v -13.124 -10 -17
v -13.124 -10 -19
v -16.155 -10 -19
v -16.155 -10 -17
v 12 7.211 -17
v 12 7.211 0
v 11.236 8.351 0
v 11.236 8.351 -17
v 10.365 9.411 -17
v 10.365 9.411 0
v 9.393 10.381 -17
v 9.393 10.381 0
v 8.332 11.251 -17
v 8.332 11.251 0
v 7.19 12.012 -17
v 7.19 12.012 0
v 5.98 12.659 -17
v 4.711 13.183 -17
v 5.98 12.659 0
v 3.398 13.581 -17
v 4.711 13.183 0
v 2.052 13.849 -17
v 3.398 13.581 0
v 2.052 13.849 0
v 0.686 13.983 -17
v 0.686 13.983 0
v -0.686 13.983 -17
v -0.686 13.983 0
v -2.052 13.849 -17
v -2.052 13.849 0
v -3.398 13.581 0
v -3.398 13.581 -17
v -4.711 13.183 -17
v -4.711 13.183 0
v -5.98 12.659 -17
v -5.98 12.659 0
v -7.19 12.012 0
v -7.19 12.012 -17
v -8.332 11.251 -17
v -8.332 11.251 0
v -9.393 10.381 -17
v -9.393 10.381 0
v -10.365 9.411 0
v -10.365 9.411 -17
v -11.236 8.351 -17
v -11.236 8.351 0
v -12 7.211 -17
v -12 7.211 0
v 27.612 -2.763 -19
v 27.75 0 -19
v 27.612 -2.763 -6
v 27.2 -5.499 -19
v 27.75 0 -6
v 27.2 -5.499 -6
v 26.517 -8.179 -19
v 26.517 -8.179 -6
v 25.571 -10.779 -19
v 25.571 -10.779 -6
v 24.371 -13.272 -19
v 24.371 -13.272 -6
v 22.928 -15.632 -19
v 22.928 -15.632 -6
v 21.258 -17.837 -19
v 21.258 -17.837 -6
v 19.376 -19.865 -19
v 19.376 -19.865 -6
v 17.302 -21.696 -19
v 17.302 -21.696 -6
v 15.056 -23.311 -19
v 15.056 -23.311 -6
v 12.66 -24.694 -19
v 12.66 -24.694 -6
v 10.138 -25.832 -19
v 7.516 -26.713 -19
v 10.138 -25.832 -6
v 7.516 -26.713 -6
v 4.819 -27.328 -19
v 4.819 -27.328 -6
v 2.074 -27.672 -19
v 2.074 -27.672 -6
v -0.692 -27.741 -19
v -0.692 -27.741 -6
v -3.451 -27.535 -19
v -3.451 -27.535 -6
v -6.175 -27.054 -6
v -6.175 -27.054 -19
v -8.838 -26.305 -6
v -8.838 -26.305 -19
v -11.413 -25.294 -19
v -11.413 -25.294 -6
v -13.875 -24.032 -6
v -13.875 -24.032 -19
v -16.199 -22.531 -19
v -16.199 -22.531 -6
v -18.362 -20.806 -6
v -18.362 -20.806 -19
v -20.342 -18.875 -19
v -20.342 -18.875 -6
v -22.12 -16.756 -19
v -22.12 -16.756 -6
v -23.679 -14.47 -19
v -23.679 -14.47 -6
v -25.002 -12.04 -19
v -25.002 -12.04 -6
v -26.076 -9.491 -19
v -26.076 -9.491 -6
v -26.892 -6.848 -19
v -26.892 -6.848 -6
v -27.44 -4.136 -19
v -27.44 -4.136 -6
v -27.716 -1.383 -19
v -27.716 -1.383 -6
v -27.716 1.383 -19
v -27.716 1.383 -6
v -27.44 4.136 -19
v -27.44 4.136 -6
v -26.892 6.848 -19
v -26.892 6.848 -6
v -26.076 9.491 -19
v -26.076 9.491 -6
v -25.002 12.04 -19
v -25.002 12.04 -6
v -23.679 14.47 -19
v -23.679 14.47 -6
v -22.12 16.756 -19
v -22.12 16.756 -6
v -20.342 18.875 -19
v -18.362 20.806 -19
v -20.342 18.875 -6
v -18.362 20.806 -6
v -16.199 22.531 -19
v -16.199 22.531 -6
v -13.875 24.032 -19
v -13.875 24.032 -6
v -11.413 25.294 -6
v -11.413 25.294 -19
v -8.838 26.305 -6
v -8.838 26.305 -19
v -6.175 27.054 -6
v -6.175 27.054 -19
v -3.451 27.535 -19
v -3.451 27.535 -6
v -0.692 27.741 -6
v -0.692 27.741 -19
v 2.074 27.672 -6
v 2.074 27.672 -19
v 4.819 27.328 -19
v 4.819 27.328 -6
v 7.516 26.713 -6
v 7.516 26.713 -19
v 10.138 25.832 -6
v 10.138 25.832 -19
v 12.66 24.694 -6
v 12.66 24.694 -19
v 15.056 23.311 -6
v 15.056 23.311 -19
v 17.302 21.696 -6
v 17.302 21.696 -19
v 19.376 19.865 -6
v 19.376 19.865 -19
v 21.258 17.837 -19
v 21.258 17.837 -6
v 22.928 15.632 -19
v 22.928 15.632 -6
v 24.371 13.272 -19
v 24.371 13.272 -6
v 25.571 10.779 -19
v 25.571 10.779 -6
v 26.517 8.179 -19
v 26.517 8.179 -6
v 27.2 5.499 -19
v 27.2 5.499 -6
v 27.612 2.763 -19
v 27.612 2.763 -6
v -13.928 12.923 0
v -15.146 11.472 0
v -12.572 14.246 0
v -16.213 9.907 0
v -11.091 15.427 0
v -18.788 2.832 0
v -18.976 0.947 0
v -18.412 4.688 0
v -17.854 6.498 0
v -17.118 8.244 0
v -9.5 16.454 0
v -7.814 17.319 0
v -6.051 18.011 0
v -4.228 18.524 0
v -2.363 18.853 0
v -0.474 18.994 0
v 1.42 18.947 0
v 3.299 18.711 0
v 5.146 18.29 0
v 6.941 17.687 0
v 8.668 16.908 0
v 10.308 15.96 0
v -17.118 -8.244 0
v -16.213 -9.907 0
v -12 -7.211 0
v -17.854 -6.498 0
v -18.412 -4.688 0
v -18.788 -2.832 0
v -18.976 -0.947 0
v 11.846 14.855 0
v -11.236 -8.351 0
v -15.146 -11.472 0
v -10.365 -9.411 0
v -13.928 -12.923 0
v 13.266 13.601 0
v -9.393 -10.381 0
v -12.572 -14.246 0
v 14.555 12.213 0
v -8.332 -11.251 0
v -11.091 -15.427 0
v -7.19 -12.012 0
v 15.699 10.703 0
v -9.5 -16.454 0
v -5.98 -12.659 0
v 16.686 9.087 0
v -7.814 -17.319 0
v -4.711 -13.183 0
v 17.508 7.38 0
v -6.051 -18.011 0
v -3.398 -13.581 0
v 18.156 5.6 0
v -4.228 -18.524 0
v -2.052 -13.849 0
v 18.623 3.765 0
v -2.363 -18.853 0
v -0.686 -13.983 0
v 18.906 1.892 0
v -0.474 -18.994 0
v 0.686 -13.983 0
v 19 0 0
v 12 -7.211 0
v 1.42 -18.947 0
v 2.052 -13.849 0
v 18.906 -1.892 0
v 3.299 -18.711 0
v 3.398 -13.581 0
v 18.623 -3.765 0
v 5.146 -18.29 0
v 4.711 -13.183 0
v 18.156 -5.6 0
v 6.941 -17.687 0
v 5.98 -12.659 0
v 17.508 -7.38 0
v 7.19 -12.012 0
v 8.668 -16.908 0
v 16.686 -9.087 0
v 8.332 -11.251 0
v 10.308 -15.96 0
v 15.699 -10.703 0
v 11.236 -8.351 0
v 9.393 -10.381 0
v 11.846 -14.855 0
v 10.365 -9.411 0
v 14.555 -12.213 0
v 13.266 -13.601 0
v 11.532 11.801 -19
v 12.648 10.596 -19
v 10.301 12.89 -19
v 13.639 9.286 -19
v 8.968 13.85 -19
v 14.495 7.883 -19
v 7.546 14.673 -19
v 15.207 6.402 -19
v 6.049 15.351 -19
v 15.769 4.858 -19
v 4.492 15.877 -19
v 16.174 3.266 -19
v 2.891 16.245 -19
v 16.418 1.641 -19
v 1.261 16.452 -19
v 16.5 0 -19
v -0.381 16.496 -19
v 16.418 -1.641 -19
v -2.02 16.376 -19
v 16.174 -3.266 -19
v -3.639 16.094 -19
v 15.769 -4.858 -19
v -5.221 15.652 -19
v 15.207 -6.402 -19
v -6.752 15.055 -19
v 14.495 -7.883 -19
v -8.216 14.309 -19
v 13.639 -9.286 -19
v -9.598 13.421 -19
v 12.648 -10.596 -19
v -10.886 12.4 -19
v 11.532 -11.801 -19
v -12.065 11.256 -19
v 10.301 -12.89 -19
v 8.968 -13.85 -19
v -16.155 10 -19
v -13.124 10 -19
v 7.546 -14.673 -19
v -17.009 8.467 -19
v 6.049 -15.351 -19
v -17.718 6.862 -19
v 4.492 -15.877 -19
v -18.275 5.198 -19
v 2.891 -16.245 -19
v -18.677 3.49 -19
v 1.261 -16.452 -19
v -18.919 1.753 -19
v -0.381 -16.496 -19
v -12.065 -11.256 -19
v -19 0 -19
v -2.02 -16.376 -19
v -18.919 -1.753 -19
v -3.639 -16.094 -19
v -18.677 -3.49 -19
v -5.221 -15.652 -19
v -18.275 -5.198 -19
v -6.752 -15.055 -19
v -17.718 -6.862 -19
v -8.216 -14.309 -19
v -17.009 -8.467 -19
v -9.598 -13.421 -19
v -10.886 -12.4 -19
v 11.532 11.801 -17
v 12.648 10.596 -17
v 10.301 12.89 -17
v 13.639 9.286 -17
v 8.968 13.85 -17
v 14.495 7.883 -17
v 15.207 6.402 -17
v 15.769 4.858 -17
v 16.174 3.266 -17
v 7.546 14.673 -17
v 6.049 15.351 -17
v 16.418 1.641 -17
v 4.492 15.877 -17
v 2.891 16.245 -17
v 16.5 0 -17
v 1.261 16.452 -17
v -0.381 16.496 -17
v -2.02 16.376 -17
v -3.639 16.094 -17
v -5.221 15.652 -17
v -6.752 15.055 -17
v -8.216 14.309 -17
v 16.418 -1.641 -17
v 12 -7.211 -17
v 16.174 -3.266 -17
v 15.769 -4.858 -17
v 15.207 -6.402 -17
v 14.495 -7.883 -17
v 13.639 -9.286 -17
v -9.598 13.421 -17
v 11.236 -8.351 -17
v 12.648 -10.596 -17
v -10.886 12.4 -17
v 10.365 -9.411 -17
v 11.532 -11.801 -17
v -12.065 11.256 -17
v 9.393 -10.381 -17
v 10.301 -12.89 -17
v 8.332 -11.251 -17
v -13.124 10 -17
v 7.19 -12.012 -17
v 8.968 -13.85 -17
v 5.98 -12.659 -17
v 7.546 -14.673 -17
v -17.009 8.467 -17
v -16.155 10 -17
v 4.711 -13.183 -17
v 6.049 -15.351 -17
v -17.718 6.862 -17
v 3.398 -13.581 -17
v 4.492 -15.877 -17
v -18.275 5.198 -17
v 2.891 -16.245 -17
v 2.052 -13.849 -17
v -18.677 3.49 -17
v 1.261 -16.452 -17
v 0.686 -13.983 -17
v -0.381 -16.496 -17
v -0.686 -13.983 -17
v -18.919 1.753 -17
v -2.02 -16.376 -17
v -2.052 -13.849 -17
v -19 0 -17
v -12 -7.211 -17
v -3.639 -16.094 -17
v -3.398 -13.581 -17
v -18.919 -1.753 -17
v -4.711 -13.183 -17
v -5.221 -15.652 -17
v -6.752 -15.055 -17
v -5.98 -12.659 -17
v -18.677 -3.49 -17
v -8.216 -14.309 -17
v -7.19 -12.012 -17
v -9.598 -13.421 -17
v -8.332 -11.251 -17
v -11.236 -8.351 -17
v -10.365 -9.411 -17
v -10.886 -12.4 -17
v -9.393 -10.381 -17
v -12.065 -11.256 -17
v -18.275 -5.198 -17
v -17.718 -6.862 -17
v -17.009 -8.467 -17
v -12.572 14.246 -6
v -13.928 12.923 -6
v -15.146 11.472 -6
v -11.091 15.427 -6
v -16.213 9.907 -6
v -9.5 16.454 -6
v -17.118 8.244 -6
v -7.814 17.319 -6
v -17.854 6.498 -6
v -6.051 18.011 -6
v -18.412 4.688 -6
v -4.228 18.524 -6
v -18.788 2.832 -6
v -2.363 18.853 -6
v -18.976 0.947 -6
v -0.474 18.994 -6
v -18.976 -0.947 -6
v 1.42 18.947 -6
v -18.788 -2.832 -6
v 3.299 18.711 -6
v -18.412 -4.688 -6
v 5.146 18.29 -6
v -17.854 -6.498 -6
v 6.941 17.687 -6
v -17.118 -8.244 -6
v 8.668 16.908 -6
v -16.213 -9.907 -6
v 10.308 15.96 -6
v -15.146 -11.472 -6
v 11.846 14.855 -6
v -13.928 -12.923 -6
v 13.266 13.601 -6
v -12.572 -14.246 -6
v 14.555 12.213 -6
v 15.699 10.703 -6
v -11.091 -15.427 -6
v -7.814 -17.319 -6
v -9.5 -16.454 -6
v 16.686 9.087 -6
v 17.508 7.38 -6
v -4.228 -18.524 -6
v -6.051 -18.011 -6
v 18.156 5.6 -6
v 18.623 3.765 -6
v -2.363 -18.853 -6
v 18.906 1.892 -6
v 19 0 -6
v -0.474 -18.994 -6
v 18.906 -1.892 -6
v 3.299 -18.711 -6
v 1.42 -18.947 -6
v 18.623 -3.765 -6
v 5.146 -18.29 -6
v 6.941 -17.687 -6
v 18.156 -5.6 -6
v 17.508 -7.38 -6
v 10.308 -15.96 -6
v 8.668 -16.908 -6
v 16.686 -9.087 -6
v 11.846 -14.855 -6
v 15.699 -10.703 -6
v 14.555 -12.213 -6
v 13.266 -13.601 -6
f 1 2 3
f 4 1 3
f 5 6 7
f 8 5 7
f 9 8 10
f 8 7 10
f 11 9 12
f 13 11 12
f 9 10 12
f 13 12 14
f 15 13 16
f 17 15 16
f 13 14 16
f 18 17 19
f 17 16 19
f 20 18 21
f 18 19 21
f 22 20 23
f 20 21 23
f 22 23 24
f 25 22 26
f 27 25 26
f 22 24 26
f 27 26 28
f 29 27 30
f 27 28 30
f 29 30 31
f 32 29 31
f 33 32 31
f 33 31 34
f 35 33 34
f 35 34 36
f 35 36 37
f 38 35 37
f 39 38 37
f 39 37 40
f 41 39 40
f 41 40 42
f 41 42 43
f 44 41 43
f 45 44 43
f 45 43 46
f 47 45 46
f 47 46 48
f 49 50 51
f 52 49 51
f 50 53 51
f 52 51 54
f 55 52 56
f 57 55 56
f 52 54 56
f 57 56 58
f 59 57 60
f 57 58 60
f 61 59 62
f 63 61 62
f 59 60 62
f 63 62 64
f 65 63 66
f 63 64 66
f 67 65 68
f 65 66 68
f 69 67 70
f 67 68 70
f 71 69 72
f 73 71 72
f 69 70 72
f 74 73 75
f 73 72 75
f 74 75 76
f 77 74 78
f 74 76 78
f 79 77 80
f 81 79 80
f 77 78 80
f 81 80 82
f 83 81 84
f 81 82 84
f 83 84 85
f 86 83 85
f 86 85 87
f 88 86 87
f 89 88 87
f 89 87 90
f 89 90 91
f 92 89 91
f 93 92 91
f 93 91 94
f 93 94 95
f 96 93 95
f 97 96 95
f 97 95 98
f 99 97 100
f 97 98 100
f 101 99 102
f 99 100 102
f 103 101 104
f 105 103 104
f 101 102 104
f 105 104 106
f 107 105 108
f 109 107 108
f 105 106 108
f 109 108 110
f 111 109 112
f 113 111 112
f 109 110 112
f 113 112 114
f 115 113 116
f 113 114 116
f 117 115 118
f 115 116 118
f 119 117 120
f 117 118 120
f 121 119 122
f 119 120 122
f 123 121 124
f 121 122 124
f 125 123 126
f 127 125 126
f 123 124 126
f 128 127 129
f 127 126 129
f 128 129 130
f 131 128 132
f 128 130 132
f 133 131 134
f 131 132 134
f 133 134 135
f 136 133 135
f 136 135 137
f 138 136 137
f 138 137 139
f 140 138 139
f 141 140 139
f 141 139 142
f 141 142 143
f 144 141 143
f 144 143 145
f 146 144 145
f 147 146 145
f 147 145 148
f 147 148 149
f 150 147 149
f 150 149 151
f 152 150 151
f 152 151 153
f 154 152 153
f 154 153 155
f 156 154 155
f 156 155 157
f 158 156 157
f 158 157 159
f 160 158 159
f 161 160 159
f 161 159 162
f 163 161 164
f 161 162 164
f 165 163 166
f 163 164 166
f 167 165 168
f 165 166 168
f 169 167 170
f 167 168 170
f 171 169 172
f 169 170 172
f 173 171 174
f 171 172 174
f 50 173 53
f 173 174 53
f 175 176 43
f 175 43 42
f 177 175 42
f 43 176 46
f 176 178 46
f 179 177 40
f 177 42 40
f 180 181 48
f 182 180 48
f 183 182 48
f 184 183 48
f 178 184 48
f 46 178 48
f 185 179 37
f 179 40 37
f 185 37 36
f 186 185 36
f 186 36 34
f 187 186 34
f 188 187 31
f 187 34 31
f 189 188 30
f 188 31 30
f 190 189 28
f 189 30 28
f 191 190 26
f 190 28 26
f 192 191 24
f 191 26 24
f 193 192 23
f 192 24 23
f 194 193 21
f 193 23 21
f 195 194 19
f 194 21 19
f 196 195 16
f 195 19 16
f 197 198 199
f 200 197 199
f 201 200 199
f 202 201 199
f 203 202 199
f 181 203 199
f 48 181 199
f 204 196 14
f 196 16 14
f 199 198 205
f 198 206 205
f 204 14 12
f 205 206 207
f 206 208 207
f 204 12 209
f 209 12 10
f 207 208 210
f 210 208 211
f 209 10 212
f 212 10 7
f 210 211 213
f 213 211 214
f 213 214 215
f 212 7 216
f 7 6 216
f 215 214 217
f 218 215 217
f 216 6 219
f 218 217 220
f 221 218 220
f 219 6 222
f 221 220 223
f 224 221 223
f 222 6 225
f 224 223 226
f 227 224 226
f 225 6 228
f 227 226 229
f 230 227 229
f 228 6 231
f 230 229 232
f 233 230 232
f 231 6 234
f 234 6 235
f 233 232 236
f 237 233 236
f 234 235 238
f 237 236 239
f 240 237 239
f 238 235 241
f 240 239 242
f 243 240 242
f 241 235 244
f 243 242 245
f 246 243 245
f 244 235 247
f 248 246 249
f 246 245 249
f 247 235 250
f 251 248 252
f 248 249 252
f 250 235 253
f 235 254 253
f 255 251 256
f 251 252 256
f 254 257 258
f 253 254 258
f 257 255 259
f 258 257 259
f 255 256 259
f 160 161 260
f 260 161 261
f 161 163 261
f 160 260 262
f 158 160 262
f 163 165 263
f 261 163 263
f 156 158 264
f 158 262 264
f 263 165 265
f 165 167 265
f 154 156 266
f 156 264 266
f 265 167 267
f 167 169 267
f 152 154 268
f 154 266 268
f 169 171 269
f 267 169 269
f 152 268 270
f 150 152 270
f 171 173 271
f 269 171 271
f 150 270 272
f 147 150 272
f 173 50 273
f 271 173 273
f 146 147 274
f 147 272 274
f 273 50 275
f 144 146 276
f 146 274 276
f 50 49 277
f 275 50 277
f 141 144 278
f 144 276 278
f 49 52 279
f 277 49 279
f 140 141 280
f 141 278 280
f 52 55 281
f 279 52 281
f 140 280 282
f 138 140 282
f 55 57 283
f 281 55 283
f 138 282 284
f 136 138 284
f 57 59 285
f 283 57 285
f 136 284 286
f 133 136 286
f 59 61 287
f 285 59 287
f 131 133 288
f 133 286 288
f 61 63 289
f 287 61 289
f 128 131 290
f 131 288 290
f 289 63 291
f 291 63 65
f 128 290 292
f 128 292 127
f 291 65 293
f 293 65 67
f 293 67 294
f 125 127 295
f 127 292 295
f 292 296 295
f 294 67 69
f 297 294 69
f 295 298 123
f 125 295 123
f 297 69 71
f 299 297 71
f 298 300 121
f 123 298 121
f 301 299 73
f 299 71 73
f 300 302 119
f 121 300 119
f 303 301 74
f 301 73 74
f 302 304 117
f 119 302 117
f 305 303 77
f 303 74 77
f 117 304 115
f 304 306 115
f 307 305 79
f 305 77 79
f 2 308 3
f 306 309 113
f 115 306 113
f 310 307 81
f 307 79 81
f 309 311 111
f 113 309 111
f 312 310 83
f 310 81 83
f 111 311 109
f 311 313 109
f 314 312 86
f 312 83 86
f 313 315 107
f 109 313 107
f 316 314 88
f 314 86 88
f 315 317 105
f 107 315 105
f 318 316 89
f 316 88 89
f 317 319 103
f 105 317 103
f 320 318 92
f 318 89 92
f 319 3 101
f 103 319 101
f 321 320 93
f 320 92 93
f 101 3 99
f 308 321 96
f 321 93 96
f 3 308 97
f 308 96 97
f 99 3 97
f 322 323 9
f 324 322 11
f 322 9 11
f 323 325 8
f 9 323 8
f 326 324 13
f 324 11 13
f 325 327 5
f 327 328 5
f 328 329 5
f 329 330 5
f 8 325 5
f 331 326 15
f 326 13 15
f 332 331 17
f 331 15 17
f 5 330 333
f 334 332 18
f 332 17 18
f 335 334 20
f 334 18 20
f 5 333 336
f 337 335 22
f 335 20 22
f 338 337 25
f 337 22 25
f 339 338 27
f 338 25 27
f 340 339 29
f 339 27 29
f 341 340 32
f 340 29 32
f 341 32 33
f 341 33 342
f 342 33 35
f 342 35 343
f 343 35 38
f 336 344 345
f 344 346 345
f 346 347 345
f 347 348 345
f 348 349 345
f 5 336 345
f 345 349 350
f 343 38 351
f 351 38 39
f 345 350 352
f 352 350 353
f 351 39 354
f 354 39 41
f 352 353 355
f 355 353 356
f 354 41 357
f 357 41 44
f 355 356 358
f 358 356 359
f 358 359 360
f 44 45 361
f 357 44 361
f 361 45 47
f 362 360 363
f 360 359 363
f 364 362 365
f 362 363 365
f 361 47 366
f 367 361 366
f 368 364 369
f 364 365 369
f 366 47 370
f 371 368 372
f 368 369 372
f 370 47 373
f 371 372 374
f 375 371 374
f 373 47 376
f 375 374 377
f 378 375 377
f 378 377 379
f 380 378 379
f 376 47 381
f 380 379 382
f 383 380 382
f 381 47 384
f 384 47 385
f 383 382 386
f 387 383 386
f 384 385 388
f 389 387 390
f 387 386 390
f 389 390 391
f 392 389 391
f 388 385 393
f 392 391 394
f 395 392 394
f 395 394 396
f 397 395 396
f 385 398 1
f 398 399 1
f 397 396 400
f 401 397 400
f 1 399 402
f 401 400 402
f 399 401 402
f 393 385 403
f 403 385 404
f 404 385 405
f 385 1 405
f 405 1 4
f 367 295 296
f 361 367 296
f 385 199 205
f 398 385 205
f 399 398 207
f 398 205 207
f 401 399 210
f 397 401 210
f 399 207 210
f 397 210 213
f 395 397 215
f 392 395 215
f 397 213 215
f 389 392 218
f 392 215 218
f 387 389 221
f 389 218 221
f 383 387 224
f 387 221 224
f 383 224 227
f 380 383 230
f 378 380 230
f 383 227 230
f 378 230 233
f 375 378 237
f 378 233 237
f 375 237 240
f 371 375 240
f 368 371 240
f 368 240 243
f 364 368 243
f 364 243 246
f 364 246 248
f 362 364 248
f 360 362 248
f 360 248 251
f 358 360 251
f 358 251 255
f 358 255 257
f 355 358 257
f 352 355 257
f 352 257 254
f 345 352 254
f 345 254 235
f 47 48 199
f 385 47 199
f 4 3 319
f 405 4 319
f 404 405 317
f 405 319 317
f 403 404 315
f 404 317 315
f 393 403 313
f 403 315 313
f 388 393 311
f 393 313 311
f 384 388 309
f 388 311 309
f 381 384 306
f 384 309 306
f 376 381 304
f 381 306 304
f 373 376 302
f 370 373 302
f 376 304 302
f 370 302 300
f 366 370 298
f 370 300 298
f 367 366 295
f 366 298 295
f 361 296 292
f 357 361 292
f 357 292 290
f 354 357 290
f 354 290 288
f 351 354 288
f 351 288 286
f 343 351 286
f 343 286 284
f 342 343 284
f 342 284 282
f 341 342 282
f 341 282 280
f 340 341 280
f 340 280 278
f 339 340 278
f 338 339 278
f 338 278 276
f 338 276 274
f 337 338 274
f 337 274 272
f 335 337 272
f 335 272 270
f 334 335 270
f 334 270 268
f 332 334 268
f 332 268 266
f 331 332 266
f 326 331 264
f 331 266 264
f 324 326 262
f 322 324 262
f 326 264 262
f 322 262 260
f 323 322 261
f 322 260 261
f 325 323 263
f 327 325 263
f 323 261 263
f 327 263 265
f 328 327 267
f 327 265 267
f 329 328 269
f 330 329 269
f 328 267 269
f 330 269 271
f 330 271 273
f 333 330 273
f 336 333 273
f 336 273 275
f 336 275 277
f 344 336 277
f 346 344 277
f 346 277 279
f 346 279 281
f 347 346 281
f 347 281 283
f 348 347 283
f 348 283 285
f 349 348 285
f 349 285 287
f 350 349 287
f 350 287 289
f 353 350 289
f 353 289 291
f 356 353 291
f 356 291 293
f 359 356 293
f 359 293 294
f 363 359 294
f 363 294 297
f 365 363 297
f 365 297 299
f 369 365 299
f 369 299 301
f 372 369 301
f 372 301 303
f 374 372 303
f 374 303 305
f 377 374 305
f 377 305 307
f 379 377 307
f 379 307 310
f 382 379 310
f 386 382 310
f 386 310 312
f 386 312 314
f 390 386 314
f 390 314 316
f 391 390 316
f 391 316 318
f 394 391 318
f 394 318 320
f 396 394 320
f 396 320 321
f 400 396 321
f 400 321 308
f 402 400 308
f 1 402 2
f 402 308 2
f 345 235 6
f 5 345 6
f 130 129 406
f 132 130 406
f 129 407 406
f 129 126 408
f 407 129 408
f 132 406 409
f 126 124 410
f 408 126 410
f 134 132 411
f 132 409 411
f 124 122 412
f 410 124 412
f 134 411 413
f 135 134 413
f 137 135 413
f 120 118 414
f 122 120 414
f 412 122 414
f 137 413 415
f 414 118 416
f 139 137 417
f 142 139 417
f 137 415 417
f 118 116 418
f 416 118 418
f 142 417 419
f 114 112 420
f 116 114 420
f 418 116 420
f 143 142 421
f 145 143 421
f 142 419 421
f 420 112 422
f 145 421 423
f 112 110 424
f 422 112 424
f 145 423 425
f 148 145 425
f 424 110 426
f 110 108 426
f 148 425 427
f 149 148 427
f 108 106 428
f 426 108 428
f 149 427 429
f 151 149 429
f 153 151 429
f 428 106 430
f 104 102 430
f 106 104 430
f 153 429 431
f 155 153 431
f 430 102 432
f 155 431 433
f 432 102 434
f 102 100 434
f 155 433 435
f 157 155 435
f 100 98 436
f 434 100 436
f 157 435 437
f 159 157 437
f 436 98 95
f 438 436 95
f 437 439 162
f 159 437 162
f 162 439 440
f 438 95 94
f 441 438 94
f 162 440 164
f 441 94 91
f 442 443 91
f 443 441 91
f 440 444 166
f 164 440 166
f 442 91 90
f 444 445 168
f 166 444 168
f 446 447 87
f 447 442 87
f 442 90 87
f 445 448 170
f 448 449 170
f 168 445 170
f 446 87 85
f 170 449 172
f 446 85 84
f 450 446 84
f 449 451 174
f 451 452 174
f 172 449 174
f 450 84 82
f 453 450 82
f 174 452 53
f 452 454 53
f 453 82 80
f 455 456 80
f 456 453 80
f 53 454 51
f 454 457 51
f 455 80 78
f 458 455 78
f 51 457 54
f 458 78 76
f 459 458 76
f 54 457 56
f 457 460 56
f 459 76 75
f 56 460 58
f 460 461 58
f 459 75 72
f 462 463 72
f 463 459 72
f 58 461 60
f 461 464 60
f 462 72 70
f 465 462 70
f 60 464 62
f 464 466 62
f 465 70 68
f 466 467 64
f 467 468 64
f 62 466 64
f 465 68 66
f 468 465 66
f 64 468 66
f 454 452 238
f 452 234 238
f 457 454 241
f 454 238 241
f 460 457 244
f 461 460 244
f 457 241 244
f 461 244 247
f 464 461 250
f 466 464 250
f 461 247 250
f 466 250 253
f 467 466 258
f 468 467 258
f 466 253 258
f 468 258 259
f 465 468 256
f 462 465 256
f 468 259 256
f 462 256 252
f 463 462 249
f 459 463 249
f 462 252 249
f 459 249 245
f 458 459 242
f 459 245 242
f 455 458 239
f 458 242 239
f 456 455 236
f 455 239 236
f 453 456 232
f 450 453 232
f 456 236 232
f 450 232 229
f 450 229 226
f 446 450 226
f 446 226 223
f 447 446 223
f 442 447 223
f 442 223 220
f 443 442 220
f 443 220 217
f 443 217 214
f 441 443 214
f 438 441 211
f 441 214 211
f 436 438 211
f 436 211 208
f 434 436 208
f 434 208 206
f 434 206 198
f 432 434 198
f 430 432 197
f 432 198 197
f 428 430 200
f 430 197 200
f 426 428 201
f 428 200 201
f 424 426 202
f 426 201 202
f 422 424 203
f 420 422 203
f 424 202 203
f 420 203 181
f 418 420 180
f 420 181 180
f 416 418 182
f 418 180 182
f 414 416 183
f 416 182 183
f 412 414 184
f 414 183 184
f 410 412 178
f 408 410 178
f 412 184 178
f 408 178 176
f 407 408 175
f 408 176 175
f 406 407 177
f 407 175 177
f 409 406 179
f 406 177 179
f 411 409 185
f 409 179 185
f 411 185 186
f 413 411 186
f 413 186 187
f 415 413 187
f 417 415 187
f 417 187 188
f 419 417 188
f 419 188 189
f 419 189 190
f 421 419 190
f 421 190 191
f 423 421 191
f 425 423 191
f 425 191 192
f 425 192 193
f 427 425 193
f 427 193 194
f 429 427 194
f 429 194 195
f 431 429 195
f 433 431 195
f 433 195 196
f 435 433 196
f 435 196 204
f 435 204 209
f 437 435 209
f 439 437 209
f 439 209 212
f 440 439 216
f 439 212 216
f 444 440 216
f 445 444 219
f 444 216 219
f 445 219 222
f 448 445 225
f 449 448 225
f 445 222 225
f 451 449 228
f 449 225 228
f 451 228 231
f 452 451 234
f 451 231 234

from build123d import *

# Parameters (mm, degrees)
F3_DEPTH = 25
F5_DEPTH = 2


with BuildPart() as f1:
    # F0 (on Front) → F1 (revolve)
    with BuildSketch(Plane.XZ):
        Polygon((19, 0), (0, 0), (0, -17), (16.5, -17), (16.5, -19), (27.75, -19), (27.75, -6), (19, -6), align=None)
    revolve(axis=Axis((0, 0, 0.8052456426), (0, 0, -1)))

    # F2 (on face) → F3 (cut)
    with BuildSketch(Plane.XY):
        with BuildLine():
            Line((-12, 7.2111025509), (-12, -7.2111025509))
            ThreePointArc((-12, -7.2111025509), (0, -14), (12, -7.2111025509))
            Line((12, -7.2111025509), (12, 7.2111025509))
            ThreePointArc((12, 7.2111025509), (0, 14), (-12, 7.2111025509))
        make_face()
    extrude(amount=-F3_DEPTH, mode=Mode.SUBTRACT)

    # F4 (on face) → F5 (cut, through all)
    with BuildSketch(Plane(origin=(0, 0, -19), x_dir=(1, 0, 0), z_dir=(0, 0, -1))):
        with BuildLine():
            Line((-13.1244047484, 10), (-16.1554944214, 10))
            ThreePointArc((-16.1554944214, 10), (-19, 0), (-16.1554944214, -10))
            Line((-16.1554944214, -10), (-13.1244047484, -10))
            ThreePointArc((-13.1244047484, -10), (-16.5, 0), (-13.1244047484, 10))
        make_face()
    extrude(amount=-F5_DEPTH, mode=Mode.SUBTRACT)


solid = f1.part
